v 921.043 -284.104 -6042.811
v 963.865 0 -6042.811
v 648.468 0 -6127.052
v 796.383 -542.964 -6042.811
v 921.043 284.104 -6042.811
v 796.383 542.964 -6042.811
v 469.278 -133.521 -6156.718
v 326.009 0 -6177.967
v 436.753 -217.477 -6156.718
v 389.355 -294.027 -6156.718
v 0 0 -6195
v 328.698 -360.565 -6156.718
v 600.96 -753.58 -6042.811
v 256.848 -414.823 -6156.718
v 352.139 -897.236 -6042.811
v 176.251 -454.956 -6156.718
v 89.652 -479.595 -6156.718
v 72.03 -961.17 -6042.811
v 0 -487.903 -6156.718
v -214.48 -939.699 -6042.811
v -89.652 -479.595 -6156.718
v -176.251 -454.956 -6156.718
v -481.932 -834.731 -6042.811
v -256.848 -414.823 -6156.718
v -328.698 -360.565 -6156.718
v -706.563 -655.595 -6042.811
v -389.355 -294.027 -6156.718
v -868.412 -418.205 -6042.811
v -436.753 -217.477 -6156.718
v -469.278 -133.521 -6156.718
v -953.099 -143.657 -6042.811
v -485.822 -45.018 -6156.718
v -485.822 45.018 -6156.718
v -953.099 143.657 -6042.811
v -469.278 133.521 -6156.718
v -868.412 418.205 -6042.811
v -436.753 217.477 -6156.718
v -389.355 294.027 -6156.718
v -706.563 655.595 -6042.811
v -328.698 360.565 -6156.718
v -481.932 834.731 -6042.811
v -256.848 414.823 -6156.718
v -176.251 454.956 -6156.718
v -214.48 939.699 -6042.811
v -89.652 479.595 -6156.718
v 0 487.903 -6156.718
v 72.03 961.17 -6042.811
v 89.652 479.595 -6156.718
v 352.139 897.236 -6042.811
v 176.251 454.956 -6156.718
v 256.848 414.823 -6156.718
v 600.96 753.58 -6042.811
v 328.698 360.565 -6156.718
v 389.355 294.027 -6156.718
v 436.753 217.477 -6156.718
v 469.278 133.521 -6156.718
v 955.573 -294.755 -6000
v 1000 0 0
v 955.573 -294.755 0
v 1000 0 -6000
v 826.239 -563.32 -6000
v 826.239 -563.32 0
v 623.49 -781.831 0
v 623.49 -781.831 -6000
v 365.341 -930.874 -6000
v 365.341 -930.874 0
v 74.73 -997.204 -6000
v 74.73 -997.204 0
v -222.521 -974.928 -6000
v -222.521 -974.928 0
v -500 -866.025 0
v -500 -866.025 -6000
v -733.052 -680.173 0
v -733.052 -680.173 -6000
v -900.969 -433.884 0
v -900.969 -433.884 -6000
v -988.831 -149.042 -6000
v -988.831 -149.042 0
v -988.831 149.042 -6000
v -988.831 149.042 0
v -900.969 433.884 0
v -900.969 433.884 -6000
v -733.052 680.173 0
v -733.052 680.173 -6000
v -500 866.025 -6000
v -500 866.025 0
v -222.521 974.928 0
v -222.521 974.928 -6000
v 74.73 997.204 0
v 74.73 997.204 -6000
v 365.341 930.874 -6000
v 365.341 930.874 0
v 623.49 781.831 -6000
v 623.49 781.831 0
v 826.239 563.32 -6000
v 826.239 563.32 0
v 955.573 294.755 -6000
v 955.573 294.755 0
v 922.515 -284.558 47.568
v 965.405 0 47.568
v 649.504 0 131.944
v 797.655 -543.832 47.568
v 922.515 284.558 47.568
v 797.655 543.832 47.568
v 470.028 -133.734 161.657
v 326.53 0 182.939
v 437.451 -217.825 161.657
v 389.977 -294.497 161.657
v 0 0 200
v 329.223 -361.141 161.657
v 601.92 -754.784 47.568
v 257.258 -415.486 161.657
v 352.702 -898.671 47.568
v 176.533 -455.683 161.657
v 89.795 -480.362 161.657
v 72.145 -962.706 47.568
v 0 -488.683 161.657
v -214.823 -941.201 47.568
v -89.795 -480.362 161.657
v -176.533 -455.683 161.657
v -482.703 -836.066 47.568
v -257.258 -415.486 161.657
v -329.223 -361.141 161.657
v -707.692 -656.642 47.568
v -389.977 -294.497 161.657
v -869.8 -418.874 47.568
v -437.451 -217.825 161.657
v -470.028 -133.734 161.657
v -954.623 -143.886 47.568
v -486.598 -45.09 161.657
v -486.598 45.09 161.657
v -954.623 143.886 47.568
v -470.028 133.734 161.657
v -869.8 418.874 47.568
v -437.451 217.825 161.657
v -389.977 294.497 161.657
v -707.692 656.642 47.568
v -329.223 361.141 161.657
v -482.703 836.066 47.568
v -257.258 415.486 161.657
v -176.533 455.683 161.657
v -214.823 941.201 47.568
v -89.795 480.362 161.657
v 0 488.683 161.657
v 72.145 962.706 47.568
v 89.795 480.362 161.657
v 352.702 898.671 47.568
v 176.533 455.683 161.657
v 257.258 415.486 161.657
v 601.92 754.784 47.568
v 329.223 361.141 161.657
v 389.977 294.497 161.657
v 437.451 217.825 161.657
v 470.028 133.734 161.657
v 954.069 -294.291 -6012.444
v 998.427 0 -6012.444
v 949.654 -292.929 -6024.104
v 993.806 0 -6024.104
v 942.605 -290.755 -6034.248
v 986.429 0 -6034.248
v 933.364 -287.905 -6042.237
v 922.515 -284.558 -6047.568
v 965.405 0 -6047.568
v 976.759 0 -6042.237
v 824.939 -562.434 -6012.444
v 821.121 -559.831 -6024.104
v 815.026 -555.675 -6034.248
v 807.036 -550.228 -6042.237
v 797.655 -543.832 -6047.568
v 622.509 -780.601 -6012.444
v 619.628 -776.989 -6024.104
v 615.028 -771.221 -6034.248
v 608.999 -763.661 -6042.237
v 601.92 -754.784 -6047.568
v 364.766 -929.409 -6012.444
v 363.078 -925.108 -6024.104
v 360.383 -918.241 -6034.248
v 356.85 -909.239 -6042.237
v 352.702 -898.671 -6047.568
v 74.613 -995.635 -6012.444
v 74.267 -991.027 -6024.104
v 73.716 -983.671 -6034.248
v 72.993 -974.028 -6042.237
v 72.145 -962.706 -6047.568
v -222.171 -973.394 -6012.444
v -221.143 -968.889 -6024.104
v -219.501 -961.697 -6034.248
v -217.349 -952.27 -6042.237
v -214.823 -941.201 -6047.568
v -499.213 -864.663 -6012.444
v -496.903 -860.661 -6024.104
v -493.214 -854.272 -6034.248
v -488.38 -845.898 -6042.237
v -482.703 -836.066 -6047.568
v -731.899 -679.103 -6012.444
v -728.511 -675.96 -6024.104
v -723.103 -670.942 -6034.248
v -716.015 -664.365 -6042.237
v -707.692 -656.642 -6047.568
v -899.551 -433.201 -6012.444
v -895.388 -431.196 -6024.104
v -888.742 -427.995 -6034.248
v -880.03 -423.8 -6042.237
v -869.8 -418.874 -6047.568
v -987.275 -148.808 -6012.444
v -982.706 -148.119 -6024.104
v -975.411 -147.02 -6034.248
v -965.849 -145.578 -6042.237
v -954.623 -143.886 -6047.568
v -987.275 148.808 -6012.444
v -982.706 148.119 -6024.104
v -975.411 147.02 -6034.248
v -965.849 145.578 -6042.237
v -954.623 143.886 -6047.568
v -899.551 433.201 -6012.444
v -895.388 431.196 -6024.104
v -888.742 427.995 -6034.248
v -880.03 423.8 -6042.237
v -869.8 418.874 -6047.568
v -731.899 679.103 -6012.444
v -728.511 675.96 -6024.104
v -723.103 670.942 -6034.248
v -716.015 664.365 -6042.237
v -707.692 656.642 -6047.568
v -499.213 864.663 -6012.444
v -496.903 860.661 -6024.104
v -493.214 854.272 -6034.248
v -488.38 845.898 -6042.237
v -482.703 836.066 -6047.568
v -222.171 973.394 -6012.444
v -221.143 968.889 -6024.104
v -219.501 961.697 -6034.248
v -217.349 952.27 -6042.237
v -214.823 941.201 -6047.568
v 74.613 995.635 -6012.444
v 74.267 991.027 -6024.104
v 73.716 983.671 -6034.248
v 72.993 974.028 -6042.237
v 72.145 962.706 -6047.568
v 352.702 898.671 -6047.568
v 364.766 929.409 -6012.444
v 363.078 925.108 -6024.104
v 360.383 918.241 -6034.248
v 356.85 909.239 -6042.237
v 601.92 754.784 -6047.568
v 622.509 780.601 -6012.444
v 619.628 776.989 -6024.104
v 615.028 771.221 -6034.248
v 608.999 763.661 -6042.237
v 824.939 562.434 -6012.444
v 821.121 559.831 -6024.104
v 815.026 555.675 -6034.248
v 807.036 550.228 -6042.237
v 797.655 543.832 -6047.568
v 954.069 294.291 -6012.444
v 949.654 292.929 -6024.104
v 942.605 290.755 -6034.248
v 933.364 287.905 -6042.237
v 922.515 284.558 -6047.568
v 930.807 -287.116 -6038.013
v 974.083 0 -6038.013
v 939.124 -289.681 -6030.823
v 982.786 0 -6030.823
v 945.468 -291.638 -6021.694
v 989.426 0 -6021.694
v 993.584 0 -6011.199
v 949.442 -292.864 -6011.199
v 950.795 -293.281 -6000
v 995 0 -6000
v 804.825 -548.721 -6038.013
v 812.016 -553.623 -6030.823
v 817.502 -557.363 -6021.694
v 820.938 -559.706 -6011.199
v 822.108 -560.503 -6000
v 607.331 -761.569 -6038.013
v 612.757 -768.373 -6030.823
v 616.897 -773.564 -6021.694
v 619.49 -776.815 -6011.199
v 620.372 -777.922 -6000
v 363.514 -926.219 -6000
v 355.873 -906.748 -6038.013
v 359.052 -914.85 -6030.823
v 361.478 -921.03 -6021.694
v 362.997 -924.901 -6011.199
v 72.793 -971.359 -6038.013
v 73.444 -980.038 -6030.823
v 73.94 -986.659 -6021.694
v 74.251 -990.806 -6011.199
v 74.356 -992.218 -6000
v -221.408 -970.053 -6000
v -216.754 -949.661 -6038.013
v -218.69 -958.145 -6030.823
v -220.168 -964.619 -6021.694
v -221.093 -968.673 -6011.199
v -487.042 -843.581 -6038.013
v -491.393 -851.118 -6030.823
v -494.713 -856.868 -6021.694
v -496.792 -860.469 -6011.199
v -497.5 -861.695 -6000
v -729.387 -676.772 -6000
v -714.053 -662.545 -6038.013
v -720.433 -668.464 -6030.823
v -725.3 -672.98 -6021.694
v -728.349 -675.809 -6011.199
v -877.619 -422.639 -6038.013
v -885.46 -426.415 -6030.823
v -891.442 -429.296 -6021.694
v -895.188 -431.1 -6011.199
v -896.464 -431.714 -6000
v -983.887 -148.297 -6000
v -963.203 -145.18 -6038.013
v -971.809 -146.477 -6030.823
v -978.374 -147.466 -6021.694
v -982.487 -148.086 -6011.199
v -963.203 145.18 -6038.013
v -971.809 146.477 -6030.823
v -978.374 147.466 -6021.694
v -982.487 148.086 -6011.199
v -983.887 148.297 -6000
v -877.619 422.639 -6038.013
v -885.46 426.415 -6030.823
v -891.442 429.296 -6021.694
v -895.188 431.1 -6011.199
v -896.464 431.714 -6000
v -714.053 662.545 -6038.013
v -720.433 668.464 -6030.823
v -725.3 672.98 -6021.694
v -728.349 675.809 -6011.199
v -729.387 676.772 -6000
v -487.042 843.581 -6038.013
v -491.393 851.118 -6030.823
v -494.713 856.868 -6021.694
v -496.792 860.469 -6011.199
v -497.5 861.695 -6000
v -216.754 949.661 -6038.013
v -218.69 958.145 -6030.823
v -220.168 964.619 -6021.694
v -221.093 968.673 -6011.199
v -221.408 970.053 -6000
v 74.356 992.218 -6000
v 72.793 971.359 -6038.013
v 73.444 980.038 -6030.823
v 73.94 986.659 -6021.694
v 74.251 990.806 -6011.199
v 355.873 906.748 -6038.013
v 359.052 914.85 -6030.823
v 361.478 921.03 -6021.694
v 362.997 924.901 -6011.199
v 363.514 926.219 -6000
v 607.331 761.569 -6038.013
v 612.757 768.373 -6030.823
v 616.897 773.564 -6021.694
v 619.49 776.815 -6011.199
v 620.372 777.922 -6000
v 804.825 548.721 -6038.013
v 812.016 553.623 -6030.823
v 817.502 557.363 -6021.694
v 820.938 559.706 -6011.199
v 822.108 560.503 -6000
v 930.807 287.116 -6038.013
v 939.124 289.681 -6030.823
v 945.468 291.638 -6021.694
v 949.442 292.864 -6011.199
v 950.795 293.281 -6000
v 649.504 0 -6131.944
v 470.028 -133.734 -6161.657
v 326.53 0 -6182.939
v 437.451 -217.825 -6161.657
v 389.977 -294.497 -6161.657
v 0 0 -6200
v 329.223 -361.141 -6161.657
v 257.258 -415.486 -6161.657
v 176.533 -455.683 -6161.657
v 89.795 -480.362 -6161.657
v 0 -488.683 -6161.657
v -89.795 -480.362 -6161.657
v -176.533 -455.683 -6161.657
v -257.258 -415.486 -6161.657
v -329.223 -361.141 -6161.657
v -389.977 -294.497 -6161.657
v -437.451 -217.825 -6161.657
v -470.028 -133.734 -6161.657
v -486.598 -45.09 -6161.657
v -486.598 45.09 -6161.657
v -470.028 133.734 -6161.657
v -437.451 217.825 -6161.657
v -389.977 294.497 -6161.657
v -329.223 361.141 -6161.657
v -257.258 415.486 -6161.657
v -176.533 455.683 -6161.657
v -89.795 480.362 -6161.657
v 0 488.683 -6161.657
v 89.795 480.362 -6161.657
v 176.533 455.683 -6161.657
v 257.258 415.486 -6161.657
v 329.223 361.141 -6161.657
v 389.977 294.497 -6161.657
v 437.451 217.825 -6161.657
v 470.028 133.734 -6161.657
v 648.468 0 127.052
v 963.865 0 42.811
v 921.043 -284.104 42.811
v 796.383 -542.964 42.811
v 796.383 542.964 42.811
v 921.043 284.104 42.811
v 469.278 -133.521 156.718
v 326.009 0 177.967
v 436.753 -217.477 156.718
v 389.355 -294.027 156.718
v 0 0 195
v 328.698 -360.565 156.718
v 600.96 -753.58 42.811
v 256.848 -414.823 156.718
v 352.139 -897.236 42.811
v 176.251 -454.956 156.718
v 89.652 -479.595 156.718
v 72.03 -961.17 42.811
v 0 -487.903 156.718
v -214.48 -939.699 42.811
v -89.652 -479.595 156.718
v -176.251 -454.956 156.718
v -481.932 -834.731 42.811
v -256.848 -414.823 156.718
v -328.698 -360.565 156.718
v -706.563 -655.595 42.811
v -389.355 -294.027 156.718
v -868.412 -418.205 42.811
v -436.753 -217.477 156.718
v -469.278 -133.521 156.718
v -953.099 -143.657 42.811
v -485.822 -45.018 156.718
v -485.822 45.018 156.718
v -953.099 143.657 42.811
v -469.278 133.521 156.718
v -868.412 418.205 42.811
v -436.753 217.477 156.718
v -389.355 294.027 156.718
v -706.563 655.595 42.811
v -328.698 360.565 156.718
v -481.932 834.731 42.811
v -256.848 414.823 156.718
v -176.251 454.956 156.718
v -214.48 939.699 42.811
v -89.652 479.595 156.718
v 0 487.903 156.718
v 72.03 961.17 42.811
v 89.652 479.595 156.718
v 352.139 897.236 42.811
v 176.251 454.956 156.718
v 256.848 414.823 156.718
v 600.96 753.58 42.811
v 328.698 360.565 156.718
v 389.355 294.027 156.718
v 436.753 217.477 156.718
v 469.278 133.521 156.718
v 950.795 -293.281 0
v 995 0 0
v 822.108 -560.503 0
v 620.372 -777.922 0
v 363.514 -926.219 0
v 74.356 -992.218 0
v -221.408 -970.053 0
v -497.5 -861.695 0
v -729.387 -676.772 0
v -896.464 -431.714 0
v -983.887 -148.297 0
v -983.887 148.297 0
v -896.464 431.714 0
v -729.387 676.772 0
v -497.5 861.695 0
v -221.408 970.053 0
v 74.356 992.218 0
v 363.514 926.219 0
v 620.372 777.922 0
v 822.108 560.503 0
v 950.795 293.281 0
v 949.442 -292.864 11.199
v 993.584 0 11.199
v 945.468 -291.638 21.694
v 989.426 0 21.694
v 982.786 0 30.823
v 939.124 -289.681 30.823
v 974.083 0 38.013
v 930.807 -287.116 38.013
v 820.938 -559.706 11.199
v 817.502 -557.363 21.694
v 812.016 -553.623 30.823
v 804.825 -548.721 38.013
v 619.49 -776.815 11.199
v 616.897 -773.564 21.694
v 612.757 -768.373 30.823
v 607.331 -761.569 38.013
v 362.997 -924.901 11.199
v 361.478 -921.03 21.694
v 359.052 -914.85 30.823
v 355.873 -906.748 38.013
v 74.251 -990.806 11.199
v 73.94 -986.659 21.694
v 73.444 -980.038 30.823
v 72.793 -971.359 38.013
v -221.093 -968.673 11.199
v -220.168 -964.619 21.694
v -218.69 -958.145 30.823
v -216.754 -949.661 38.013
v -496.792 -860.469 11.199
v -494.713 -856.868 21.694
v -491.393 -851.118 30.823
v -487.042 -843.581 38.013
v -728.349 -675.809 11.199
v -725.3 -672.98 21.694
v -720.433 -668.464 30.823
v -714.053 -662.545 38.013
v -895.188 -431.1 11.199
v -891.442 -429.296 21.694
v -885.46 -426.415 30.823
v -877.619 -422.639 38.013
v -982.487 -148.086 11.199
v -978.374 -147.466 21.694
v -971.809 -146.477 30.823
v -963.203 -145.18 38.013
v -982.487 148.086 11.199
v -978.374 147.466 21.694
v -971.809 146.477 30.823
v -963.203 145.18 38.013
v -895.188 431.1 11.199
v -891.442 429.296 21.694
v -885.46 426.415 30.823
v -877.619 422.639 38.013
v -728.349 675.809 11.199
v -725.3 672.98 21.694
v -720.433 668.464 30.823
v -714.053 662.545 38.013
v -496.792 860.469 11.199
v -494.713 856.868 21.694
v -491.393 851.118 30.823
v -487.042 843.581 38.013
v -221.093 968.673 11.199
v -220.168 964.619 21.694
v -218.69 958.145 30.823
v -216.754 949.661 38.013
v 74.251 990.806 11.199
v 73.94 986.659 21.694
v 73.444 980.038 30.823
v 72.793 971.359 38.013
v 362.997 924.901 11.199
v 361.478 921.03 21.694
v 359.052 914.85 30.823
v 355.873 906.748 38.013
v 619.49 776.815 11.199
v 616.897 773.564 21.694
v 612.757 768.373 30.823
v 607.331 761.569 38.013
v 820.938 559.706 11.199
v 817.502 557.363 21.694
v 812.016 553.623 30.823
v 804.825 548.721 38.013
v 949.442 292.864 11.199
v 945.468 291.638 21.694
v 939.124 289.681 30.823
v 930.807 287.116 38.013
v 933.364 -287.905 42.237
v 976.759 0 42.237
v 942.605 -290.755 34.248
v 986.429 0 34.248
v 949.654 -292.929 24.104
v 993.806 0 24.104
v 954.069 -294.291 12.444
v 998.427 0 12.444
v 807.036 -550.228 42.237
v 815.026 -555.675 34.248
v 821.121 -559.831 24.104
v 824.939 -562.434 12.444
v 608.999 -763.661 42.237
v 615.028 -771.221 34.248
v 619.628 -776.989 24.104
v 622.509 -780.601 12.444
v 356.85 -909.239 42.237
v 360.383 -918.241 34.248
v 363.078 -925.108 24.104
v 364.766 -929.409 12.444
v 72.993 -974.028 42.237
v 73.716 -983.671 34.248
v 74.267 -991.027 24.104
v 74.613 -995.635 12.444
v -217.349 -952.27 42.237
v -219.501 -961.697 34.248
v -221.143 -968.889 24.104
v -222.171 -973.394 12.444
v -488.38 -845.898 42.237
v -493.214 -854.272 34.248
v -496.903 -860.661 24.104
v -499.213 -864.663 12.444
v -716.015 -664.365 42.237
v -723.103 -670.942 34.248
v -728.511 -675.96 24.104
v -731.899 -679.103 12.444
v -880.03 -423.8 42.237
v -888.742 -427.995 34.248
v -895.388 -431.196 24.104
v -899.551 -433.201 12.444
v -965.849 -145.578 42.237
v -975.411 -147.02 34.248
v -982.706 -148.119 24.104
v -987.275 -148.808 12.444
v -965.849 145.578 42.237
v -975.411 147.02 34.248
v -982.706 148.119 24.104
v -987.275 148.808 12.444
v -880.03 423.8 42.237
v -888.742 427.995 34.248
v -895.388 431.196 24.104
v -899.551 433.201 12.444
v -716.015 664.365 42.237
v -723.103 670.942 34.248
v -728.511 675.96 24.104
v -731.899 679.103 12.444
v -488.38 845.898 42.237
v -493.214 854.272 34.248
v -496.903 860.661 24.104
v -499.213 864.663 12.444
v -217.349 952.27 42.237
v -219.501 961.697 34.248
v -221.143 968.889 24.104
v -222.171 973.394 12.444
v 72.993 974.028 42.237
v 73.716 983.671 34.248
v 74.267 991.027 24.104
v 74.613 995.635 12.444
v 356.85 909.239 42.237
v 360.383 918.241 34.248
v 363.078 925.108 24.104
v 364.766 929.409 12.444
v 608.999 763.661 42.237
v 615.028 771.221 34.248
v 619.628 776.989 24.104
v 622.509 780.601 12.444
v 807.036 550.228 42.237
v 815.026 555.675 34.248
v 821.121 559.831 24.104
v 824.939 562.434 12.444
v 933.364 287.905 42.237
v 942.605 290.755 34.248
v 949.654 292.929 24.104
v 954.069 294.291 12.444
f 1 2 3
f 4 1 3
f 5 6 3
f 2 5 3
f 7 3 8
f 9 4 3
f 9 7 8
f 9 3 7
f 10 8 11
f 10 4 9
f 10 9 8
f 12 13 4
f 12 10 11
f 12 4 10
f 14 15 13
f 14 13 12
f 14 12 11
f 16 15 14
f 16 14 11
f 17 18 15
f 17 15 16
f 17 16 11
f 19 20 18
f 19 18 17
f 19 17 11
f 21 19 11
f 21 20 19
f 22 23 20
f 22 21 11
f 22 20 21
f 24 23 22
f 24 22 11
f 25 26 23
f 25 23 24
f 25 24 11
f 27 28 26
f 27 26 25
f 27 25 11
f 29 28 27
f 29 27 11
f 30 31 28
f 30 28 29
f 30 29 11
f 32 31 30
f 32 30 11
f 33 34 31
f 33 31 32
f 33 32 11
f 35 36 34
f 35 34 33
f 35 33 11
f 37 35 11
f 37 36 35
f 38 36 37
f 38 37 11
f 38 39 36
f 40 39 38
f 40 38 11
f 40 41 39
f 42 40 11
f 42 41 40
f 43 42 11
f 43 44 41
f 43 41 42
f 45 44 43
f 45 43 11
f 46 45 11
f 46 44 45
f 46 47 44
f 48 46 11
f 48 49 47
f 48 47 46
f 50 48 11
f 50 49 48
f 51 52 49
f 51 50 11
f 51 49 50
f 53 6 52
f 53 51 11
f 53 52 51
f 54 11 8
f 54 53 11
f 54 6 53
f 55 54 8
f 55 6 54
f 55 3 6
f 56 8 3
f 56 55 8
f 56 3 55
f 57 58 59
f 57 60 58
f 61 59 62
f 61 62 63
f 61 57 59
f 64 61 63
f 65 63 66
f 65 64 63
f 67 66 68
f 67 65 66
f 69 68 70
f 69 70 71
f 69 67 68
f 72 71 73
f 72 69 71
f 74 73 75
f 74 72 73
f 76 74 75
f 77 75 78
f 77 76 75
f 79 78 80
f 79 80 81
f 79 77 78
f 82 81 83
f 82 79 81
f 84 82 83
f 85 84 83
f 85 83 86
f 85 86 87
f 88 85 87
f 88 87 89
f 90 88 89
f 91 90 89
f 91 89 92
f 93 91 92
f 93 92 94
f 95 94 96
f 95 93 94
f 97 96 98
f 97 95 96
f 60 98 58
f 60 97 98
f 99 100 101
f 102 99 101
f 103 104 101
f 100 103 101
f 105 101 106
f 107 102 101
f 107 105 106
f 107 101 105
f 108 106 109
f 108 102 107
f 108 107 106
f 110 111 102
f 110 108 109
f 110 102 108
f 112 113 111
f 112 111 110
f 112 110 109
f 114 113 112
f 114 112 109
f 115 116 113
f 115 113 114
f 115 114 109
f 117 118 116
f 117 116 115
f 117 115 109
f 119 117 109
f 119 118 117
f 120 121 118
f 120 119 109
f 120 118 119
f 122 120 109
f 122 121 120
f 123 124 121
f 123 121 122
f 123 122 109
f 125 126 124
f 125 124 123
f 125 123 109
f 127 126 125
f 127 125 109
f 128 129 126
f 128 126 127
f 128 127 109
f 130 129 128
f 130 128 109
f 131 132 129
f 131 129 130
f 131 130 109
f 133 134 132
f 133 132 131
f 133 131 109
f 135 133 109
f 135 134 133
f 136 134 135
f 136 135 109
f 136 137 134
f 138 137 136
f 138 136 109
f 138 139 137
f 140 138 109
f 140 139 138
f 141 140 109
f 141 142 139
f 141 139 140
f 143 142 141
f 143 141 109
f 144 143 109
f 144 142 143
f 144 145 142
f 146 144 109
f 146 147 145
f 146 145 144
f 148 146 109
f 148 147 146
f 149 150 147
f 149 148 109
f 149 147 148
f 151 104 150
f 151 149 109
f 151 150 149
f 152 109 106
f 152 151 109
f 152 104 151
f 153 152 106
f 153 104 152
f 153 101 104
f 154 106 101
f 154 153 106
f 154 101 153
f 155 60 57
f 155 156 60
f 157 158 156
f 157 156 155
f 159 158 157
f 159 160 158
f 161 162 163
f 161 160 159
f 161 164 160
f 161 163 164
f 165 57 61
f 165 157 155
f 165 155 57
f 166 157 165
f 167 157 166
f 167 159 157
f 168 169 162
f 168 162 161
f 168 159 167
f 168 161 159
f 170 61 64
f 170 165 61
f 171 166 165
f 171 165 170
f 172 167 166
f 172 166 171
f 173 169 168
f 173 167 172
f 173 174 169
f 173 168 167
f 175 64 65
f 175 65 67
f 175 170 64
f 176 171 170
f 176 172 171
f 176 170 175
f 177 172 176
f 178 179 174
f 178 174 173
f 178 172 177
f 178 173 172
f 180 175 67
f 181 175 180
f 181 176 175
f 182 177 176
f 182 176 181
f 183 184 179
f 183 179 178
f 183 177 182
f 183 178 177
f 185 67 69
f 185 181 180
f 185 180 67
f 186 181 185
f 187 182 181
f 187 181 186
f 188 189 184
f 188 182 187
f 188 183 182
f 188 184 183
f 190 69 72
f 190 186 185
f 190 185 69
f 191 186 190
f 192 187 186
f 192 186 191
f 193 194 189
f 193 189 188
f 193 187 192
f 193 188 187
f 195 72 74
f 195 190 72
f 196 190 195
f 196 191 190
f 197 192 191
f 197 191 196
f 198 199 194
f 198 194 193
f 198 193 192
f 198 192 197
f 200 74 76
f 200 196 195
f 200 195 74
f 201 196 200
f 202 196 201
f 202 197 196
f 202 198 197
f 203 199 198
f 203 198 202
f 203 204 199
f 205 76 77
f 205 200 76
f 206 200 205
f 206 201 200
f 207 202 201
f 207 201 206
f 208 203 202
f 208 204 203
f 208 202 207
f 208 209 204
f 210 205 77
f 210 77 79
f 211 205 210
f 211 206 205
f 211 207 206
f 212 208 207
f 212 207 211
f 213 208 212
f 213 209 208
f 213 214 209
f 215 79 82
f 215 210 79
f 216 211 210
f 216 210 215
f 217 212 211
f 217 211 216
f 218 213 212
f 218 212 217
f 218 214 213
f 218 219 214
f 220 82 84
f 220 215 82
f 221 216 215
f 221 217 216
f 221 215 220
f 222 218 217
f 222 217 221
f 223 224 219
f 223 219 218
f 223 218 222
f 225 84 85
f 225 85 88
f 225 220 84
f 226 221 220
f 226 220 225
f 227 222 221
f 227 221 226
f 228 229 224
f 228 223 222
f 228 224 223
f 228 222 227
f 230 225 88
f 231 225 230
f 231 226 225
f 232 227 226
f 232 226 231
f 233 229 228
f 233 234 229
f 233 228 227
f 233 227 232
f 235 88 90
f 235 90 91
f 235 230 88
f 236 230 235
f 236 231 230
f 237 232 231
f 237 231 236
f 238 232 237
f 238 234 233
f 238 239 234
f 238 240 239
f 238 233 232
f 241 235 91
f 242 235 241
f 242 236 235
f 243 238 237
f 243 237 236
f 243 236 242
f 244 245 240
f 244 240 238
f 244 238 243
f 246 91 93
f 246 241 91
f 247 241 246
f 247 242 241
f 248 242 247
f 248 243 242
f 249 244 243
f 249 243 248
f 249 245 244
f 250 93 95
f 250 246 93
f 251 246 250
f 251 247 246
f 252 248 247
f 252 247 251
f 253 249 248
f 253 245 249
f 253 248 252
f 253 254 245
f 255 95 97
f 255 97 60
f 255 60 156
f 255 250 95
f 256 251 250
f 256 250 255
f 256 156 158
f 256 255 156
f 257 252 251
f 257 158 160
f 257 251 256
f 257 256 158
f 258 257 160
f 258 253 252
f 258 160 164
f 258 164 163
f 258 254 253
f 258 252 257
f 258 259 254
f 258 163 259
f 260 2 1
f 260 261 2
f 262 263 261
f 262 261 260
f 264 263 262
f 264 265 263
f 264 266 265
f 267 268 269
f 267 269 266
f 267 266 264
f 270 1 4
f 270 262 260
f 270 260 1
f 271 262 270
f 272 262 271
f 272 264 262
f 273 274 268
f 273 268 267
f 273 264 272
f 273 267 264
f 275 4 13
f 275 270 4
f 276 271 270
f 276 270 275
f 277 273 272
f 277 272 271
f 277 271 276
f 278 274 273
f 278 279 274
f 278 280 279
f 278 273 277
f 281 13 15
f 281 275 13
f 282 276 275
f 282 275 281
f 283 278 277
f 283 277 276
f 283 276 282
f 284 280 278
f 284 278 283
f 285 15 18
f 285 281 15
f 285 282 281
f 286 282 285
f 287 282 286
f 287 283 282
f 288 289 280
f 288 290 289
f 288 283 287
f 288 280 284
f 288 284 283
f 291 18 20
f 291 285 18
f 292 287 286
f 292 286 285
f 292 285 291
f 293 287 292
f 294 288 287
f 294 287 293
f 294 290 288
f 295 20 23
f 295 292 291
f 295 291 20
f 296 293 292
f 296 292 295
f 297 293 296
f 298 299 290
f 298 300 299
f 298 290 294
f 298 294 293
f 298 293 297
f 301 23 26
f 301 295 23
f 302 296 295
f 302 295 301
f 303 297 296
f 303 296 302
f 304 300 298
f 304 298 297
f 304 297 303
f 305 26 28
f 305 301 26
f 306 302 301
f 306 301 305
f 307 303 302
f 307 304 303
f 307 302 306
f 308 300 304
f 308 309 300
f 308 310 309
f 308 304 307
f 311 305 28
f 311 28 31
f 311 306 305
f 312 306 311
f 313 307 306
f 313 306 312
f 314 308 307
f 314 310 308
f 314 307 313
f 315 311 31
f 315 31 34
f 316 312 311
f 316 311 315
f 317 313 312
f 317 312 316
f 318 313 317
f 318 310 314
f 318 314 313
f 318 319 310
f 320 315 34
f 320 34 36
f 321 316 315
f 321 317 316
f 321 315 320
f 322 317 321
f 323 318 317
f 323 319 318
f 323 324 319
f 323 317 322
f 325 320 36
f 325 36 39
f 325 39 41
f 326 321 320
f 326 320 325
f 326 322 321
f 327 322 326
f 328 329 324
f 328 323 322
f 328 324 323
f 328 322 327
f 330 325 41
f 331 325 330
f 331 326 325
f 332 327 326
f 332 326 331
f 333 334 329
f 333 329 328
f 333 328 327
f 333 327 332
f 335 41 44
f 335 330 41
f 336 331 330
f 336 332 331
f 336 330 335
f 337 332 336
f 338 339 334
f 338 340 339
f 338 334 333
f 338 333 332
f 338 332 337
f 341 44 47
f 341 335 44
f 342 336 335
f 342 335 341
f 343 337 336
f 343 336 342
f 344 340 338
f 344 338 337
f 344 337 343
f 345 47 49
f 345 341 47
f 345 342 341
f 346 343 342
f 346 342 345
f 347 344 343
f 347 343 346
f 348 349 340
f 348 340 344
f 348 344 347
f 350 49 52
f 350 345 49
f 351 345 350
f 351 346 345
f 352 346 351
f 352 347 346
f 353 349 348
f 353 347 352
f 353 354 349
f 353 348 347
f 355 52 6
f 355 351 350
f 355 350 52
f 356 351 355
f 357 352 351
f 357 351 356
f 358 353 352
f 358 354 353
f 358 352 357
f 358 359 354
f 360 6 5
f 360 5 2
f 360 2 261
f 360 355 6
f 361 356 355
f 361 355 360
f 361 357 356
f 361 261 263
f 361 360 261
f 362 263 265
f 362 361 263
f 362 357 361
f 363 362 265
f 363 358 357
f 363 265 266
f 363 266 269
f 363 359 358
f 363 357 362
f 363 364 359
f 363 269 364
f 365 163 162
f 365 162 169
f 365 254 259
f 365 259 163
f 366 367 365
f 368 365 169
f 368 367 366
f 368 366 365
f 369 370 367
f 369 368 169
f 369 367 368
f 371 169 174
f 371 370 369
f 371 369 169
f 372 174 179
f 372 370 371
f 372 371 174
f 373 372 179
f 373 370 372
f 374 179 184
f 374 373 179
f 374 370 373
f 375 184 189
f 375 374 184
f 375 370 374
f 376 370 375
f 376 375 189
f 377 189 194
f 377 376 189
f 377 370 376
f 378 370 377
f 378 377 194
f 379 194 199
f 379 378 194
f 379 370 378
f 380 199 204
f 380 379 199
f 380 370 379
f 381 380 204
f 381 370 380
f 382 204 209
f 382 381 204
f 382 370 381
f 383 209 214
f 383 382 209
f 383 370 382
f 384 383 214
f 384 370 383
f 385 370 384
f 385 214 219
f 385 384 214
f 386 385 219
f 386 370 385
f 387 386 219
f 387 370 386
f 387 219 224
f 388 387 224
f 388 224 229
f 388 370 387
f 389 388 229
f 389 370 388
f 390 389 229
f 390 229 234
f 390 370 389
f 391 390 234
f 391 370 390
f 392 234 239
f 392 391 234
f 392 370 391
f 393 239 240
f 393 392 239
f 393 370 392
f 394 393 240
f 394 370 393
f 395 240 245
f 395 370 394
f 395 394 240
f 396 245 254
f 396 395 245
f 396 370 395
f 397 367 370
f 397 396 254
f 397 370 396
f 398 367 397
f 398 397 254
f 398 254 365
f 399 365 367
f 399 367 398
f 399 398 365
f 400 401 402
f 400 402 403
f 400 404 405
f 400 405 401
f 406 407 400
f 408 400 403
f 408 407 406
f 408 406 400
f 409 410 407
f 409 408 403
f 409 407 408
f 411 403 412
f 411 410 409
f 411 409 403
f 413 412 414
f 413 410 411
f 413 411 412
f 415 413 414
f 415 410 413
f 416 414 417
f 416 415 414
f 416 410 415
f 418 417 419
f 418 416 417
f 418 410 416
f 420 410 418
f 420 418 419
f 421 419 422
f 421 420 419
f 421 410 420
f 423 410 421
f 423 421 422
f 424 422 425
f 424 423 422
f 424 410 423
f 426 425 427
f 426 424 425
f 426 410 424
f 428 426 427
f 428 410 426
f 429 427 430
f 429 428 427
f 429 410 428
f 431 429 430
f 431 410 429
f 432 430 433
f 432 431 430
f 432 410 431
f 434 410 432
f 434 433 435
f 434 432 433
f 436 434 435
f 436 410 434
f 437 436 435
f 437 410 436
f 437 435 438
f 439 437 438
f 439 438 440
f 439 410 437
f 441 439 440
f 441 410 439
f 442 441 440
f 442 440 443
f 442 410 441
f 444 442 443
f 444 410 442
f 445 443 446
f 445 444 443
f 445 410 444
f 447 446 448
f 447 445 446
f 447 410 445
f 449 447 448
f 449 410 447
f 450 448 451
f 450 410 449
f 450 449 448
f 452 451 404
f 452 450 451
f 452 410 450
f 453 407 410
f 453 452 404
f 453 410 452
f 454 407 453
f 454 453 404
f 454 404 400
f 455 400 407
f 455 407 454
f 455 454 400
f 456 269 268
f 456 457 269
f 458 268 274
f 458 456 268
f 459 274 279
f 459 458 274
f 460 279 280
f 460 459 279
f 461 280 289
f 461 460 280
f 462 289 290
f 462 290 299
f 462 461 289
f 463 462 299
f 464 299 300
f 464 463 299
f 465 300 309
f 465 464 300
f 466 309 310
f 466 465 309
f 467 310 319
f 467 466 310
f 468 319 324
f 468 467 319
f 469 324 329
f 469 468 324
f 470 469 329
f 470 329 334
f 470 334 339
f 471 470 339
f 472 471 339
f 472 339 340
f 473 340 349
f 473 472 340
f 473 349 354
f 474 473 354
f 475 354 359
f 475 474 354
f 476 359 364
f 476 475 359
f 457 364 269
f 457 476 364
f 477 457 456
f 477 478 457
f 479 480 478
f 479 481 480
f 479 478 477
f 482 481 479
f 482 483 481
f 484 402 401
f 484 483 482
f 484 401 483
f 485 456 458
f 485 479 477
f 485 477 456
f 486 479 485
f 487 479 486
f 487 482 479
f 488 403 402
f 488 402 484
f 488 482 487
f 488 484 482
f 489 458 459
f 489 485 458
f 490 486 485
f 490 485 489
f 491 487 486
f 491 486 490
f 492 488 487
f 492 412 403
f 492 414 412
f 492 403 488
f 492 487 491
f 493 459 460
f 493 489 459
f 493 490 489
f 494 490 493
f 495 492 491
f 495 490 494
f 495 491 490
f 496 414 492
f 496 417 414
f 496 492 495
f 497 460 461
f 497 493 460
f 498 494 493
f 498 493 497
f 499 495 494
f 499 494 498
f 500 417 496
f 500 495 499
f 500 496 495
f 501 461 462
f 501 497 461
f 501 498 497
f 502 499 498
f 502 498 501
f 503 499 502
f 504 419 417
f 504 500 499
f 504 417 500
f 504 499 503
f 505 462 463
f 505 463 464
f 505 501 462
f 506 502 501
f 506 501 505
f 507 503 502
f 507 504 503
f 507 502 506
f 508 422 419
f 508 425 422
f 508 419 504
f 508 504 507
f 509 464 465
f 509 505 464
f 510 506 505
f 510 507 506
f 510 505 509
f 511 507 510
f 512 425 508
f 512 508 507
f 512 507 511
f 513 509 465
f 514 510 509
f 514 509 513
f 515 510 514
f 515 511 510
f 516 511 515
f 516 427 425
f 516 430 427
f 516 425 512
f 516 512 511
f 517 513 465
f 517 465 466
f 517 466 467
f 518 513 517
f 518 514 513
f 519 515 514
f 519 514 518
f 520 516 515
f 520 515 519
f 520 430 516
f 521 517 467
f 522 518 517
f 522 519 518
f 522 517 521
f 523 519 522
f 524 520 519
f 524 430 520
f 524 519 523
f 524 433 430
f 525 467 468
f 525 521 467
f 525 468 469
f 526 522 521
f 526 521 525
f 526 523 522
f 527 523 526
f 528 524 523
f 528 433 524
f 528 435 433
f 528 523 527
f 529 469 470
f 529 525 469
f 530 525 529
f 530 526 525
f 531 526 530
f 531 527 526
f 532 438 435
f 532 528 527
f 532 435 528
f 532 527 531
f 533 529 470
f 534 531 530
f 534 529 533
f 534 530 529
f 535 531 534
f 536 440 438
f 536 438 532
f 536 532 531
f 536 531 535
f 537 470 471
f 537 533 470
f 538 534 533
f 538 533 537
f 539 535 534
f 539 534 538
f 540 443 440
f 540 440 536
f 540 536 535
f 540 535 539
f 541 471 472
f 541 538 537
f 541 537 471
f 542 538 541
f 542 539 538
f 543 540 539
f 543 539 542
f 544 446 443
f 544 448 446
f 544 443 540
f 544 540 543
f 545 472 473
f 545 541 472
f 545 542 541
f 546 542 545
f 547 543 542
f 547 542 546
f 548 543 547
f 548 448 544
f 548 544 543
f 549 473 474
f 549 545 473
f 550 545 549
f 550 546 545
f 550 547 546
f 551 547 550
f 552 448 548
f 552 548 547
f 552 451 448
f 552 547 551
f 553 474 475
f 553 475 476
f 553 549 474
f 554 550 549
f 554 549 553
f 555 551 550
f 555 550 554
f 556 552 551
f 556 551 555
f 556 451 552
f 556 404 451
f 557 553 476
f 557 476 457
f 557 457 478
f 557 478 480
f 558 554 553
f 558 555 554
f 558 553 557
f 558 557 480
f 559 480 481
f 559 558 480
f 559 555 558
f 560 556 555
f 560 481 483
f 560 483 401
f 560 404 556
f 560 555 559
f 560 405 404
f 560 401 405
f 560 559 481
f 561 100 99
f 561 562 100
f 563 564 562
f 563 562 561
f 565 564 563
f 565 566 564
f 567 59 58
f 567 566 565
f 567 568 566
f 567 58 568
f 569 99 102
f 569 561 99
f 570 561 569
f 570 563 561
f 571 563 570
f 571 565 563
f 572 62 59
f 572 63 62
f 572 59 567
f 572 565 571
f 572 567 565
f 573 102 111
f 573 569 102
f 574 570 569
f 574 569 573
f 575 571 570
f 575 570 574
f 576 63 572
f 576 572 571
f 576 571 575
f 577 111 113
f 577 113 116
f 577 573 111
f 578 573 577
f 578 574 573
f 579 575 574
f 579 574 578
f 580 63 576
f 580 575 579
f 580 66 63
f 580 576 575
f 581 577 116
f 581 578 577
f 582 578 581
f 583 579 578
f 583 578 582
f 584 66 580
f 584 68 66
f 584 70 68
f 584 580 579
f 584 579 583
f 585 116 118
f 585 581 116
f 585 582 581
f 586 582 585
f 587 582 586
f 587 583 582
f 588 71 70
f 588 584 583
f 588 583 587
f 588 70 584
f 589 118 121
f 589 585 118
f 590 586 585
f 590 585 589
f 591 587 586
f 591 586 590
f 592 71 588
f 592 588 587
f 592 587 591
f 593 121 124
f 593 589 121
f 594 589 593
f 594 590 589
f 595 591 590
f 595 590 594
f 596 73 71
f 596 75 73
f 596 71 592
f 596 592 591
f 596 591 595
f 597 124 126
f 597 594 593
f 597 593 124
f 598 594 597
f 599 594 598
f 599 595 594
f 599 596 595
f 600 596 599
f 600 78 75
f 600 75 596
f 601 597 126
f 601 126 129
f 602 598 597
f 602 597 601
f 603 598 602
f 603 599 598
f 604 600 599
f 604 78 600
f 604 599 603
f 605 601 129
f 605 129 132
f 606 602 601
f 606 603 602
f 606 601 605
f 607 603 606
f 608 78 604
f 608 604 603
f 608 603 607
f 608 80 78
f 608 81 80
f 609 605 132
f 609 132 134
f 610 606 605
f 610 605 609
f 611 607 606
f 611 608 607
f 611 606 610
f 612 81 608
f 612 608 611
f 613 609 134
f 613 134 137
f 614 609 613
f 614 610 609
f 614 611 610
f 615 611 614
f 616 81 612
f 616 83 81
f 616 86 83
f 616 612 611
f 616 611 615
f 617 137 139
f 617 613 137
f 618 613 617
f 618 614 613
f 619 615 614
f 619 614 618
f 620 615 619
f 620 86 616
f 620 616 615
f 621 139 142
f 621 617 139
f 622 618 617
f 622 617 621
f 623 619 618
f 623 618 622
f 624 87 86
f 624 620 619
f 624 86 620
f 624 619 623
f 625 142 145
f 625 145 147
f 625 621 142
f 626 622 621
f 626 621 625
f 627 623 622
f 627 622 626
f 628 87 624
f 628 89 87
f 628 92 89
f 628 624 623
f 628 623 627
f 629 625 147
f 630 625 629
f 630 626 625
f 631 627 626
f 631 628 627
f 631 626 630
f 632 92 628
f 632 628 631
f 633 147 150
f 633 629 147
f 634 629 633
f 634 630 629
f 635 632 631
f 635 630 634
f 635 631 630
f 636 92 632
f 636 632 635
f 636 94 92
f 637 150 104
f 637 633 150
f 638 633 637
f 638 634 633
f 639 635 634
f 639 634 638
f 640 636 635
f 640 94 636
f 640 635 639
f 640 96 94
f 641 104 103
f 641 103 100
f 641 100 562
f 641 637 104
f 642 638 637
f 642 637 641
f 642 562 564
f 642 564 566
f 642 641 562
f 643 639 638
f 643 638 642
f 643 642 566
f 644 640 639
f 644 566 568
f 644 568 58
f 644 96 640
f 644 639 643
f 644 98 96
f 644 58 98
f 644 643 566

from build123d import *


with BuildPart() as part:
    # Szkic1 → Obr_t-cienka _cianka1 (revolve)
    with BuildSketch(Plane(origin=(0, 0, 0), x_dir=(0, 0, -1), z_dir=(1, 0, 0)), mode=Mode.PRIVATE) as obr_t_cienka_cianka1_sk:
        with BuildLine():
            ThreePointArc((-200, 0), (-161.657291364, 488.682730215), (-47.567567568, 965.405405405))
            ThreePointArc((-47.567567568, 965.405405405), (-29.408584884, 990.436804215), (0, 1000))
            Line((0, 1000), (6000, 1000))
            ThreePointArc((6000, 1000), (6029.408584884, 990.436804215), (6047.567567568, 965.405405405))
            ThreePointArc((6047.567567568, 965.405405405), (6161.657291364, 488.682730215), (6200, 0))
            Line((6200, 0), (6195, 0))
            ThreePointArc((6195, 0), (6156.718476538, 487.902917348), (6042.810810811, 963.864864865))
            ThreePointArc((6042.810810811, 963.864864865), (6026.467726395, 986.393123794), (6000, 995))
            Line((6000, 995), (0, 995))
            ThreePointArc((0, 995), (-26.467726395, 986.393123794), (-42.810810811, 963.864864865))
            ThreePointArc((-42.810810811, 963.864864865), (-156.718476538, 487.902917348), (-195, 0))
            Line((-195, 0), (-200, 0))
        make_face()
    revolve(obr_t_cienka_cianka1_sk.sketch.rotate(Axis((0, 0, 0), (0, 0, -1)), 90), axis=Axis((0, 0, 0), (0, 0, -1)))  # turned: the seam where the file's is


solid = part.part
